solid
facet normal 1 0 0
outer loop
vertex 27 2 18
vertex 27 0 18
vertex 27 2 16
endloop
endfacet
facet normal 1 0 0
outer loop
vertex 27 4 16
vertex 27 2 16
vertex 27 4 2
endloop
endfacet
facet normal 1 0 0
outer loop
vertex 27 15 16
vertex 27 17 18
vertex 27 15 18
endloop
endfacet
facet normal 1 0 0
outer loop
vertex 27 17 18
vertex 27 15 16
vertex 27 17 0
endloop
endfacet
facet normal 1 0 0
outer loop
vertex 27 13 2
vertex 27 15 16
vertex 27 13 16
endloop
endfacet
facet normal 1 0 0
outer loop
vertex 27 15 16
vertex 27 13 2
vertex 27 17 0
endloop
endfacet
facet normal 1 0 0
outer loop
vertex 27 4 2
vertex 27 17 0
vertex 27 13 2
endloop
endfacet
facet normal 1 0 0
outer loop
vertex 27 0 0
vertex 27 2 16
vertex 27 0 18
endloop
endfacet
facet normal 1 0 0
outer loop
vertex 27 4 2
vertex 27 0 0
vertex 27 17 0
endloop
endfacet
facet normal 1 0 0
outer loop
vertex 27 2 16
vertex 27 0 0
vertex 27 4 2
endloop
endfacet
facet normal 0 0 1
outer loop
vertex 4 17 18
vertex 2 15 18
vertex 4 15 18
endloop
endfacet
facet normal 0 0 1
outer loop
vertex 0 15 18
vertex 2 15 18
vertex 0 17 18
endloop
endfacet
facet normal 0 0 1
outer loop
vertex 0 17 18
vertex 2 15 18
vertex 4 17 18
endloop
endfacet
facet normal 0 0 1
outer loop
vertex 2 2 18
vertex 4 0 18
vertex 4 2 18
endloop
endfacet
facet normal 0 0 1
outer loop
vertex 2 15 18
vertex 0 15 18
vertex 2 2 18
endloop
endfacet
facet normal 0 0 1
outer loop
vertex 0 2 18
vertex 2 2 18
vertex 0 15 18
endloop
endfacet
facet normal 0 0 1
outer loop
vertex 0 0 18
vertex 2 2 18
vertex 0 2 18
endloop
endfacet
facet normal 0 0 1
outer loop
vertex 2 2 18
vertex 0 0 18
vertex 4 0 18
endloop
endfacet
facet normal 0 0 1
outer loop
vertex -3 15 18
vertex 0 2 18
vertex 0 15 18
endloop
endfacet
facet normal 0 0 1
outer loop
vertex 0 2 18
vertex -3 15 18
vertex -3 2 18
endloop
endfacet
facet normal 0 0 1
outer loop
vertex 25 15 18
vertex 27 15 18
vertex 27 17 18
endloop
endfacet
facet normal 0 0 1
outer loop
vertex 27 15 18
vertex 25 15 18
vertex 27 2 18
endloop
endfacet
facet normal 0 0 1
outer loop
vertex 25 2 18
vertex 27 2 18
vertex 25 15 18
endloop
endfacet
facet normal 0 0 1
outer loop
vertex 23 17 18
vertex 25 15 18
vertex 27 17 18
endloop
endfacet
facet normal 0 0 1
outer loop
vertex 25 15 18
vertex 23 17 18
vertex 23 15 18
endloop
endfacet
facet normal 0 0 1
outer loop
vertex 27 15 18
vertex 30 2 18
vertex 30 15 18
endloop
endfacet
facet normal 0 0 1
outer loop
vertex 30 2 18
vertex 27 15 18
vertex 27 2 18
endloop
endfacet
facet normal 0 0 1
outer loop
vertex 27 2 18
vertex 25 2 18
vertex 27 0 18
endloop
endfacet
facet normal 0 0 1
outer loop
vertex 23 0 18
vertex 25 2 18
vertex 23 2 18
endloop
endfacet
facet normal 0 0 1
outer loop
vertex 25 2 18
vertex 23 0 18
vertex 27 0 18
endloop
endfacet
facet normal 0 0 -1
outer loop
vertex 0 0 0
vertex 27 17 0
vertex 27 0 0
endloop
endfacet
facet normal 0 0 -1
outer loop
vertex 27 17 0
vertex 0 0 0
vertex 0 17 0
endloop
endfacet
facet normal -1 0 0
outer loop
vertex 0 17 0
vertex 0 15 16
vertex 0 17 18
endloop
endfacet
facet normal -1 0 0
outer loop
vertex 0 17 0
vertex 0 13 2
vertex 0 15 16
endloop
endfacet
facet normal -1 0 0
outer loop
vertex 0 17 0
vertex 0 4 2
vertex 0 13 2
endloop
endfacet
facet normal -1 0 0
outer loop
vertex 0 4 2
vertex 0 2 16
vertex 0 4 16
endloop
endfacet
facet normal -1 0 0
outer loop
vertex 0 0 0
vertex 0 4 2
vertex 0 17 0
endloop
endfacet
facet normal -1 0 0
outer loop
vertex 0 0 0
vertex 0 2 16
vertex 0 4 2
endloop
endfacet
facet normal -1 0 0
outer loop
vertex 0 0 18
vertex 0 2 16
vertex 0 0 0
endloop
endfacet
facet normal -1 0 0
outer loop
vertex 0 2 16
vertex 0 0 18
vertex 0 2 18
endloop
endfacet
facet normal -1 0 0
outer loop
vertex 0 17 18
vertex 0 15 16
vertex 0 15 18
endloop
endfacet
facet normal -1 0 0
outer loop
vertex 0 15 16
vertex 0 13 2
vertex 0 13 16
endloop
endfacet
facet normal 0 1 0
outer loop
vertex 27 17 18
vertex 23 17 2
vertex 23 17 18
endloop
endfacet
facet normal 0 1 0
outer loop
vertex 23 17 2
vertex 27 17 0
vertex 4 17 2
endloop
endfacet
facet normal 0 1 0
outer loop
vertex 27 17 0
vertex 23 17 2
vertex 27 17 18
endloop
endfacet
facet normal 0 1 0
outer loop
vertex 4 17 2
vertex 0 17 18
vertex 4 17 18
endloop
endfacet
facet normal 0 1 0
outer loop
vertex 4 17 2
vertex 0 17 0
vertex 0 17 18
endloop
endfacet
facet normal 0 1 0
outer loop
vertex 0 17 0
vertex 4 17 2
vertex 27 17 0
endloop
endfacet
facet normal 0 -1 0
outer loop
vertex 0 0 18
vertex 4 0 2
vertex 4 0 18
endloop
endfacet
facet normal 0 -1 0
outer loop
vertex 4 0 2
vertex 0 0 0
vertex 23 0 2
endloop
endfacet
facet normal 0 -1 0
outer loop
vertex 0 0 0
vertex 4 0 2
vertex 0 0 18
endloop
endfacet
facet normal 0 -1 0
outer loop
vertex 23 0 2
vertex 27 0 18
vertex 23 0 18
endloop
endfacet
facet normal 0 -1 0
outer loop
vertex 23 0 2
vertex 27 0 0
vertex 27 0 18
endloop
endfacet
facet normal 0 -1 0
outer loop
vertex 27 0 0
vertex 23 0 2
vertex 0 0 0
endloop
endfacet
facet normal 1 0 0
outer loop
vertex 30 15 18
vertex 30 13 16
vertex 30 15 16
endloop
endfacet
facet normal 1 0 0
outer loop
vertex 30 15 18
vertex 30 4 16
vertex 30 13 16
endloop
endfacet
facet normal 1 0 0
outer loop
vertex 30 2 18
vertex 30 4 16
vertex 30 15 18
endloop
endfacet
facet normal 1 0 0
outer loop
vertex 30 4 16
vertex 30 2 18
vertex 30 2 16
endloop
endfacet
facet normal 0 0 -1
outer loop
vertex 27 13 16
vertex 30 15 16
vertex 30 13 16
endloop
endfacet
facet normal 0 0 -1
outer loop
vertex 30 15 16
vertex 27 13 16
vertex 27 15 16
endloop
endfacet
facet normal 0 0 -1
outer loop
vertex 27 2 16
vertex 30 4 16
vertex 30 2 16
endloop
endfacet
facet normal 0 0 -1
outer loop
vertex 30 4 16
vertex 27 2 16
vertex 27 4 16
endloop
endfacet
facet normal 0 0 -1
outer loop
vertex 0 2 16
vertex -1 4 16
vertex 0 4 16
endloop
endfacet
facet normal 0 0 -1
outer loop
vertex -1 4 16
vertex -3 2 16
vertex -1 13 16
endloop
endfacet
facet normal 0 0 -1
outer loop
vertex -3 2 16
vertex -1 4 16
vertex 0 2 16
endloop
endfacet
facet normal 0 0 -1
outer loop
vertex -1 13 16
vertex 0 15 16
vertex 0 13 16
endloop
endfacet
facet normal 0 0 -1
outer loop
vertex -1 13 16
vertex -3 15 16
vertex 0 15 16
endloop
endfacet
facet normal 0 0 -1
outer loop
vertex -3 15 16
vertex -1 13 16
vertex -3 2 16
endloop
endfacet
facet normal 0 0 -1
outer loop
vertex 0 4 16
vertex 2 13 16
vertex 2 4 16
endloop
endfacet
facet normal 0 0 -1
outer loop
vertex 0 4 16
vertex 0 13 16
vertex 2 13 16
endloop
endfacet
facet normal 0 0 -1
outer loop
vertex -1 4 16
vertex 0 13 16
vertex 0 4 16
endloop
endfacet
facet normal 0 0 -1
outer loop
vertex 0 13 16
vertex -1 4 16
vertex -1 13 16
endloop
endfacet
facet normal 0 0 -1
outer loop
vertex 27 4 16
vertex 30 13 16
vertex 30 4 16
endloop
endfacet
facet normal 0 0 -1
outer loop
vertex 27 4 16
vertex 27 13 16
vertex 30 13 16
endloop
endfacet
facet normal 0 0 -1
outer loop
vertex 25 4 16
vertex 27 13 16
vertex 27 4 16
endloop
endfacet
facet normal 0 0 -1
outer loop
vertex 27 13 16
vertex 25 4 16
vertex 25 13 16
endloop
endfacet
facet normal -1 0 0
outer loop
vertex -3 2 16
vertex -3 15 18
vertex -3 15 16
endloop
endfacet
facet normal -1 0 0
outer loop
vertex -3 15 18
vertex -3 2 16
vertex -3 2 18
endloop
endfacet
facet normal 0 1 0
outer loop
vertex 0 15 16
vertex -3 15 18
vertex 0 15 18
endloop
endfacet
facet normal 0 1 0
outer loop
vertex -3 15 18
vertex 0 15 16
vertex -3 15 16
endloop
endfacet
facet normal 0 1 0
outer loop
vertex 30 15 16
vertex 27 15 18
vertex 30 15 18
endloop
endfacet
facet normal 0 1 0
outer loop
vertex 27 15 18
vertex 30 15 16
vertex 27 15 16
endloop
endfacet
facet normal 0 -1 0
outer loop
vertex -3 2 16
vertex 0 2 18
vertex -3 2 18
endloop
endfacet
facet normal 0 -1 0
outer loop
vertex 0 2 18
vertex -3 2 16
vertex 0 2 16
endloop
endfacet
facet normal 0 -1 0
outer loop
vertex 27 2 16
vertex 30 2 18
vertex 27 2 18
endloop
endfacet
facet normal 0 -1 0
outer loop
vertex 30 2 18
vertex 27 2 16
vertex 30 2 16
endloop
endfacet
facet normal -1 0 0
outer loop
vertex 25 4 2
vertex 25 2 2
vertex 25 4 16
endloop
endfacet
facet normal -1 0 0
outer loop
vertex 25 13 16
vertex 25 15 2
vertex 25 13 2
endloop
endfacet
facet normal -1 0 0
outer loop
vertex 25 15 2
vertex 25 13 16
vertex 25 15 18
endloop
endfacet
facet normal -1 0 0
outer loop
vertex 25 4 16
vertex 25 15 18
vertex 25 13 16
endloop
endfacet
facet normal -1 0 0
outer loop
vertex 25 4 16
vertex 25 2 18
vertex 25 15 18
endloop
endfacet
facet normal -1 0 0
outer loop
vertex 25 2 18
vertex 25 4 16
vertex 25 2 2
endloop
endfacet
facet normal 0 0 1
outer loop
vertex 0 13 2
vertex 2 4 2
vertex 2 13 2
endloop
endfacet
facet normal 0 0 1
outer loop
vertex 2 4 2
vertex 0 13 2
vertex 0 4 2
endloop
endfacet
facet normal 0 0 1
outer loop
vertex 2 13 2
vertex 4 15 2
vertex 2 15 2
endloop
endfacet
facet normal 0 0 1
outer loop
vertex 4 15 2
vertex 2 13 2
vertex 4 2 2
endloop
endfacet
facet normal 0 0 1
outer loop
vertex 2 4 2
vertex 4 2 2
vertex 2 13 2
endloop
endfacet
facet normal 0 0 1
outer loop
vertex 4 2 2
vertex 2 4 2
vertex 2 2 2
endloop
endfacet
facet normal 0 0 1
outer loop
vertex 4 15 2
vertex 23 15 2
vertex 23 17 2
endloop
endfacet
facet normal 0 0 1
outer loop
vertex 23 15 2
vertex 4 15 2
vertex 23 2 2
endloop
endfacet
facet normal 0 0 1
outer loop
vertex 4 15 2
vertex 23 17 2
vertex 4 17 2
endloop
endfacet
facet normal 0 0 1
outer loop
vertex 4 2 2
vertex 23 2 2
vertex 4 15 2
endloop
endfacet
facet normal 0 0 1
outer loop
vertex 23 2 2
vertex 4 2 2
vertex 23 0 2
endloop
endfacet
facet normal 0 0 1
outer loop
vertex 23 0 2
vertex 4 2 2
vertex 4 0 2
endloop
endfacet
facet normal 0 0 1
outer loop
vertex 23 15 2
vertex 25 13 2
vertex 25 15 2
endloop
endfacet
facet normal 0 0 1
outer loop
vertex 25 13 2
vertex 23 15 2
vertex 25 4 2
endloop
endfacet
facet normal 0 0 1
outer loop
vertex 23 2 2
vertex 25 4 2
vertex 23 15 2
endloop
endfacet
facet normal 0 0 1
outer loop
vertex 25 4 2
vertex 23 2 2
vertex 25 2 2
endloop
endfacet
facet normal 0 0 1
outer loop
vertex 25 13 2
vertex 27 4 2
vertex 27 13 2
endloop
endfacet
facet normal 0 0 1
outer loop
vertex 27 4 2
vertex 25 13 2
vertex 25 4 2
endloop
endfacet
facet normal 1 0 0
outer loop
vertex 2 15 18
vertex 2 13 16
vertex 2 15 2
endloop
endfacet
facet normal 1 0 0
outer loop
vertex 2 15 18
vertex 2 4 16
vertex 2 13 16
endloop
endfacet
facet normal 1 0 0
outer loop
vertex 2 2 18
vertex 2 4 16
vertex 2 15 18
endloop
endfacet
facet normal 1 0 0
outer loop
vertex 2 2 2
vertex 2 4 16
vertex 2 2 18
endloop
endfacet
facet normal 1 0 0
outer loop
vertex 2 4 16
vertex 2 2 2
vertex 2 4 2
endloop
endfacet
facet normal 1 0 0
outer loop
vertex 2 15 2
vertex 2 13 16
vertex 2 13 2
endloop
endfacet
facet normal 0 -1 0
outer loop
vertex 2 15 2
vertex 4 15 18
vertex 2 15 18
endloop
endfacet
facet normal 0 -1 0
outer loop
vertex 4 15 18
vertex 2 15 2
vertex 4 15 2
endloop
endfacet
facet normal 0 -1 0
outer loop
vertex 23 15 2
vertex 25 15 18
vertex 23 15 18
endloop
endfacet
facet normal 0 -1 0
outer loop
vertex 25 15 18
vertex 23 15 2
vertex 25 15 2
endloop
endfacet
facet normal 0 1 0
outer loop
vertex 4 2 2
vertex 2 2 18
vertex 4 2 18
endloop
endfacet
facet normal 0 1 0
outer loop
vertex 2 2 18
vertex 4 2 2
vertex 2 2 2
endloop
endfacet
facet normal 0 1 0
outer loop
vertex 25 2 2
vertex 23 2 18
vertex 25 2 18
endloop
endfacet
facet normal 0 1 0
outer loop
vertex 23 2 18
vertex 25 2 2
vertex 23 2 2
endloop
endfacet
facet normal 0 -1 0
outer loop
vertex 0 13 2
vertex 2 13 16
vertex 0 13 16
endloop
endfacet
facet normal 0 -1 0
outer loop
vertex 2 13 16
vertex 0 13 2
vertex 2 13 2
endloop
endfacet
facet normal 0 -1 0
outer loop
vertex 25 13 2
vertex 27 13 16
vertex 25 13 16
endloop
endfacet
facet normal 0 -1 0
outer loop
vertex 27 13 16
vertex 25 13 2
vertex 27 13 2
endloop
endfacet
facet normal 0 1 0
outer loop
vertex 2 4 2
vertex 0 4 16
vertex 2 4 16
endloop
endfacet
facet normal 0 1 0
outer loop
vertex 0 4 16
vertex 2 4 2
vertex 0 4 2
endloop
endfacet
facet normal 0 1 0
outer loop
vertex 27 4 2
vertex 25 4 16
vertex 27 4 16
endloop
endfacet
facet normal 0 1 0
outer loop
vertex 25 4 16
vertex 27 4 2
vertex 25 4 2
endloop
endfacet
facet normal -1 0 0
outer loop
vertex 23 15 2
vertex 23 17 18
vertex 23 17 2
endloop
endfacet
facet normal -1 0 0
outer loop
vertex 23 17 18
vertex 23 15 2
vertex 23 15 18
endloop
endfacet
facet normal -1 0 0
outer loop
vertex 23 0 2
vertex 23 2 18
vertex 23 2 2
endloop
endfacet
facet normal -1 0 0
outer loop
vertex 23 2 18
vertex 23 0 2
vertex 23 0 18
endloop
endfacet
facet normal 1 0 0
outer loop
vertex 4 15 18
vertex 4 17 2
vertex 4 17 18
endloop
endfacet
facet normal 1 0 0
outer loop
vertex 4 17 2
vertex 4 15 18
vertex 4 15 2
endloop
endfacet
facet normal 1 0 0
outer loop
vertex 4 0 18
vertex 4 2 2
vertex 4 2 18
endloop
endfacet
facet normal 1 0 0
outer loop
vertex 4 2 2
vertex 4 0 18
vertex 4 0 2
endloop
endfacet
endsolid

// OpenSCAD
micW = 22 + 1;
micL = 12 + 1;
micH = 15 + 1;

wingWidth = 5;
cicR = 1;

thickness = 2;
difference() {
    shell();
    
    translate([thickness, 
    thickness, thickness])
        cube([micW, micL, micH]);
    
    translate([-1, 
    thickness+2, thickness])
        cube([micW+10, micL-4, 
        micH-2]);
    
    translate([thickness+2, 
    -1, thickness])
        cube([micW-4, micL+10, 
        micH+2]);
}

module shell() {
    cube([
        micW+thickness*2,
        micL+thickness*2,
        micH+thickness
    ]);
    translate([-wingWidth+thickness,
            thickness,
            micH
    ]) cube([micW+wingWidth*2,
            micL,
            thickness]);
    translate([-wingWidth/2+thickness,
            thickness+micL/2,
            micH+thickness+1.5])
        pin();
    translate([micW+thickness+wingWidth/2,
            thickness+micL/2,
            micH+thickness+1.5])
        pin();
}

module pin() {
    //Cylinders are mispositioned
    //cylinder(h=thickness+1, r=1, center=true, $fn=100);
}
